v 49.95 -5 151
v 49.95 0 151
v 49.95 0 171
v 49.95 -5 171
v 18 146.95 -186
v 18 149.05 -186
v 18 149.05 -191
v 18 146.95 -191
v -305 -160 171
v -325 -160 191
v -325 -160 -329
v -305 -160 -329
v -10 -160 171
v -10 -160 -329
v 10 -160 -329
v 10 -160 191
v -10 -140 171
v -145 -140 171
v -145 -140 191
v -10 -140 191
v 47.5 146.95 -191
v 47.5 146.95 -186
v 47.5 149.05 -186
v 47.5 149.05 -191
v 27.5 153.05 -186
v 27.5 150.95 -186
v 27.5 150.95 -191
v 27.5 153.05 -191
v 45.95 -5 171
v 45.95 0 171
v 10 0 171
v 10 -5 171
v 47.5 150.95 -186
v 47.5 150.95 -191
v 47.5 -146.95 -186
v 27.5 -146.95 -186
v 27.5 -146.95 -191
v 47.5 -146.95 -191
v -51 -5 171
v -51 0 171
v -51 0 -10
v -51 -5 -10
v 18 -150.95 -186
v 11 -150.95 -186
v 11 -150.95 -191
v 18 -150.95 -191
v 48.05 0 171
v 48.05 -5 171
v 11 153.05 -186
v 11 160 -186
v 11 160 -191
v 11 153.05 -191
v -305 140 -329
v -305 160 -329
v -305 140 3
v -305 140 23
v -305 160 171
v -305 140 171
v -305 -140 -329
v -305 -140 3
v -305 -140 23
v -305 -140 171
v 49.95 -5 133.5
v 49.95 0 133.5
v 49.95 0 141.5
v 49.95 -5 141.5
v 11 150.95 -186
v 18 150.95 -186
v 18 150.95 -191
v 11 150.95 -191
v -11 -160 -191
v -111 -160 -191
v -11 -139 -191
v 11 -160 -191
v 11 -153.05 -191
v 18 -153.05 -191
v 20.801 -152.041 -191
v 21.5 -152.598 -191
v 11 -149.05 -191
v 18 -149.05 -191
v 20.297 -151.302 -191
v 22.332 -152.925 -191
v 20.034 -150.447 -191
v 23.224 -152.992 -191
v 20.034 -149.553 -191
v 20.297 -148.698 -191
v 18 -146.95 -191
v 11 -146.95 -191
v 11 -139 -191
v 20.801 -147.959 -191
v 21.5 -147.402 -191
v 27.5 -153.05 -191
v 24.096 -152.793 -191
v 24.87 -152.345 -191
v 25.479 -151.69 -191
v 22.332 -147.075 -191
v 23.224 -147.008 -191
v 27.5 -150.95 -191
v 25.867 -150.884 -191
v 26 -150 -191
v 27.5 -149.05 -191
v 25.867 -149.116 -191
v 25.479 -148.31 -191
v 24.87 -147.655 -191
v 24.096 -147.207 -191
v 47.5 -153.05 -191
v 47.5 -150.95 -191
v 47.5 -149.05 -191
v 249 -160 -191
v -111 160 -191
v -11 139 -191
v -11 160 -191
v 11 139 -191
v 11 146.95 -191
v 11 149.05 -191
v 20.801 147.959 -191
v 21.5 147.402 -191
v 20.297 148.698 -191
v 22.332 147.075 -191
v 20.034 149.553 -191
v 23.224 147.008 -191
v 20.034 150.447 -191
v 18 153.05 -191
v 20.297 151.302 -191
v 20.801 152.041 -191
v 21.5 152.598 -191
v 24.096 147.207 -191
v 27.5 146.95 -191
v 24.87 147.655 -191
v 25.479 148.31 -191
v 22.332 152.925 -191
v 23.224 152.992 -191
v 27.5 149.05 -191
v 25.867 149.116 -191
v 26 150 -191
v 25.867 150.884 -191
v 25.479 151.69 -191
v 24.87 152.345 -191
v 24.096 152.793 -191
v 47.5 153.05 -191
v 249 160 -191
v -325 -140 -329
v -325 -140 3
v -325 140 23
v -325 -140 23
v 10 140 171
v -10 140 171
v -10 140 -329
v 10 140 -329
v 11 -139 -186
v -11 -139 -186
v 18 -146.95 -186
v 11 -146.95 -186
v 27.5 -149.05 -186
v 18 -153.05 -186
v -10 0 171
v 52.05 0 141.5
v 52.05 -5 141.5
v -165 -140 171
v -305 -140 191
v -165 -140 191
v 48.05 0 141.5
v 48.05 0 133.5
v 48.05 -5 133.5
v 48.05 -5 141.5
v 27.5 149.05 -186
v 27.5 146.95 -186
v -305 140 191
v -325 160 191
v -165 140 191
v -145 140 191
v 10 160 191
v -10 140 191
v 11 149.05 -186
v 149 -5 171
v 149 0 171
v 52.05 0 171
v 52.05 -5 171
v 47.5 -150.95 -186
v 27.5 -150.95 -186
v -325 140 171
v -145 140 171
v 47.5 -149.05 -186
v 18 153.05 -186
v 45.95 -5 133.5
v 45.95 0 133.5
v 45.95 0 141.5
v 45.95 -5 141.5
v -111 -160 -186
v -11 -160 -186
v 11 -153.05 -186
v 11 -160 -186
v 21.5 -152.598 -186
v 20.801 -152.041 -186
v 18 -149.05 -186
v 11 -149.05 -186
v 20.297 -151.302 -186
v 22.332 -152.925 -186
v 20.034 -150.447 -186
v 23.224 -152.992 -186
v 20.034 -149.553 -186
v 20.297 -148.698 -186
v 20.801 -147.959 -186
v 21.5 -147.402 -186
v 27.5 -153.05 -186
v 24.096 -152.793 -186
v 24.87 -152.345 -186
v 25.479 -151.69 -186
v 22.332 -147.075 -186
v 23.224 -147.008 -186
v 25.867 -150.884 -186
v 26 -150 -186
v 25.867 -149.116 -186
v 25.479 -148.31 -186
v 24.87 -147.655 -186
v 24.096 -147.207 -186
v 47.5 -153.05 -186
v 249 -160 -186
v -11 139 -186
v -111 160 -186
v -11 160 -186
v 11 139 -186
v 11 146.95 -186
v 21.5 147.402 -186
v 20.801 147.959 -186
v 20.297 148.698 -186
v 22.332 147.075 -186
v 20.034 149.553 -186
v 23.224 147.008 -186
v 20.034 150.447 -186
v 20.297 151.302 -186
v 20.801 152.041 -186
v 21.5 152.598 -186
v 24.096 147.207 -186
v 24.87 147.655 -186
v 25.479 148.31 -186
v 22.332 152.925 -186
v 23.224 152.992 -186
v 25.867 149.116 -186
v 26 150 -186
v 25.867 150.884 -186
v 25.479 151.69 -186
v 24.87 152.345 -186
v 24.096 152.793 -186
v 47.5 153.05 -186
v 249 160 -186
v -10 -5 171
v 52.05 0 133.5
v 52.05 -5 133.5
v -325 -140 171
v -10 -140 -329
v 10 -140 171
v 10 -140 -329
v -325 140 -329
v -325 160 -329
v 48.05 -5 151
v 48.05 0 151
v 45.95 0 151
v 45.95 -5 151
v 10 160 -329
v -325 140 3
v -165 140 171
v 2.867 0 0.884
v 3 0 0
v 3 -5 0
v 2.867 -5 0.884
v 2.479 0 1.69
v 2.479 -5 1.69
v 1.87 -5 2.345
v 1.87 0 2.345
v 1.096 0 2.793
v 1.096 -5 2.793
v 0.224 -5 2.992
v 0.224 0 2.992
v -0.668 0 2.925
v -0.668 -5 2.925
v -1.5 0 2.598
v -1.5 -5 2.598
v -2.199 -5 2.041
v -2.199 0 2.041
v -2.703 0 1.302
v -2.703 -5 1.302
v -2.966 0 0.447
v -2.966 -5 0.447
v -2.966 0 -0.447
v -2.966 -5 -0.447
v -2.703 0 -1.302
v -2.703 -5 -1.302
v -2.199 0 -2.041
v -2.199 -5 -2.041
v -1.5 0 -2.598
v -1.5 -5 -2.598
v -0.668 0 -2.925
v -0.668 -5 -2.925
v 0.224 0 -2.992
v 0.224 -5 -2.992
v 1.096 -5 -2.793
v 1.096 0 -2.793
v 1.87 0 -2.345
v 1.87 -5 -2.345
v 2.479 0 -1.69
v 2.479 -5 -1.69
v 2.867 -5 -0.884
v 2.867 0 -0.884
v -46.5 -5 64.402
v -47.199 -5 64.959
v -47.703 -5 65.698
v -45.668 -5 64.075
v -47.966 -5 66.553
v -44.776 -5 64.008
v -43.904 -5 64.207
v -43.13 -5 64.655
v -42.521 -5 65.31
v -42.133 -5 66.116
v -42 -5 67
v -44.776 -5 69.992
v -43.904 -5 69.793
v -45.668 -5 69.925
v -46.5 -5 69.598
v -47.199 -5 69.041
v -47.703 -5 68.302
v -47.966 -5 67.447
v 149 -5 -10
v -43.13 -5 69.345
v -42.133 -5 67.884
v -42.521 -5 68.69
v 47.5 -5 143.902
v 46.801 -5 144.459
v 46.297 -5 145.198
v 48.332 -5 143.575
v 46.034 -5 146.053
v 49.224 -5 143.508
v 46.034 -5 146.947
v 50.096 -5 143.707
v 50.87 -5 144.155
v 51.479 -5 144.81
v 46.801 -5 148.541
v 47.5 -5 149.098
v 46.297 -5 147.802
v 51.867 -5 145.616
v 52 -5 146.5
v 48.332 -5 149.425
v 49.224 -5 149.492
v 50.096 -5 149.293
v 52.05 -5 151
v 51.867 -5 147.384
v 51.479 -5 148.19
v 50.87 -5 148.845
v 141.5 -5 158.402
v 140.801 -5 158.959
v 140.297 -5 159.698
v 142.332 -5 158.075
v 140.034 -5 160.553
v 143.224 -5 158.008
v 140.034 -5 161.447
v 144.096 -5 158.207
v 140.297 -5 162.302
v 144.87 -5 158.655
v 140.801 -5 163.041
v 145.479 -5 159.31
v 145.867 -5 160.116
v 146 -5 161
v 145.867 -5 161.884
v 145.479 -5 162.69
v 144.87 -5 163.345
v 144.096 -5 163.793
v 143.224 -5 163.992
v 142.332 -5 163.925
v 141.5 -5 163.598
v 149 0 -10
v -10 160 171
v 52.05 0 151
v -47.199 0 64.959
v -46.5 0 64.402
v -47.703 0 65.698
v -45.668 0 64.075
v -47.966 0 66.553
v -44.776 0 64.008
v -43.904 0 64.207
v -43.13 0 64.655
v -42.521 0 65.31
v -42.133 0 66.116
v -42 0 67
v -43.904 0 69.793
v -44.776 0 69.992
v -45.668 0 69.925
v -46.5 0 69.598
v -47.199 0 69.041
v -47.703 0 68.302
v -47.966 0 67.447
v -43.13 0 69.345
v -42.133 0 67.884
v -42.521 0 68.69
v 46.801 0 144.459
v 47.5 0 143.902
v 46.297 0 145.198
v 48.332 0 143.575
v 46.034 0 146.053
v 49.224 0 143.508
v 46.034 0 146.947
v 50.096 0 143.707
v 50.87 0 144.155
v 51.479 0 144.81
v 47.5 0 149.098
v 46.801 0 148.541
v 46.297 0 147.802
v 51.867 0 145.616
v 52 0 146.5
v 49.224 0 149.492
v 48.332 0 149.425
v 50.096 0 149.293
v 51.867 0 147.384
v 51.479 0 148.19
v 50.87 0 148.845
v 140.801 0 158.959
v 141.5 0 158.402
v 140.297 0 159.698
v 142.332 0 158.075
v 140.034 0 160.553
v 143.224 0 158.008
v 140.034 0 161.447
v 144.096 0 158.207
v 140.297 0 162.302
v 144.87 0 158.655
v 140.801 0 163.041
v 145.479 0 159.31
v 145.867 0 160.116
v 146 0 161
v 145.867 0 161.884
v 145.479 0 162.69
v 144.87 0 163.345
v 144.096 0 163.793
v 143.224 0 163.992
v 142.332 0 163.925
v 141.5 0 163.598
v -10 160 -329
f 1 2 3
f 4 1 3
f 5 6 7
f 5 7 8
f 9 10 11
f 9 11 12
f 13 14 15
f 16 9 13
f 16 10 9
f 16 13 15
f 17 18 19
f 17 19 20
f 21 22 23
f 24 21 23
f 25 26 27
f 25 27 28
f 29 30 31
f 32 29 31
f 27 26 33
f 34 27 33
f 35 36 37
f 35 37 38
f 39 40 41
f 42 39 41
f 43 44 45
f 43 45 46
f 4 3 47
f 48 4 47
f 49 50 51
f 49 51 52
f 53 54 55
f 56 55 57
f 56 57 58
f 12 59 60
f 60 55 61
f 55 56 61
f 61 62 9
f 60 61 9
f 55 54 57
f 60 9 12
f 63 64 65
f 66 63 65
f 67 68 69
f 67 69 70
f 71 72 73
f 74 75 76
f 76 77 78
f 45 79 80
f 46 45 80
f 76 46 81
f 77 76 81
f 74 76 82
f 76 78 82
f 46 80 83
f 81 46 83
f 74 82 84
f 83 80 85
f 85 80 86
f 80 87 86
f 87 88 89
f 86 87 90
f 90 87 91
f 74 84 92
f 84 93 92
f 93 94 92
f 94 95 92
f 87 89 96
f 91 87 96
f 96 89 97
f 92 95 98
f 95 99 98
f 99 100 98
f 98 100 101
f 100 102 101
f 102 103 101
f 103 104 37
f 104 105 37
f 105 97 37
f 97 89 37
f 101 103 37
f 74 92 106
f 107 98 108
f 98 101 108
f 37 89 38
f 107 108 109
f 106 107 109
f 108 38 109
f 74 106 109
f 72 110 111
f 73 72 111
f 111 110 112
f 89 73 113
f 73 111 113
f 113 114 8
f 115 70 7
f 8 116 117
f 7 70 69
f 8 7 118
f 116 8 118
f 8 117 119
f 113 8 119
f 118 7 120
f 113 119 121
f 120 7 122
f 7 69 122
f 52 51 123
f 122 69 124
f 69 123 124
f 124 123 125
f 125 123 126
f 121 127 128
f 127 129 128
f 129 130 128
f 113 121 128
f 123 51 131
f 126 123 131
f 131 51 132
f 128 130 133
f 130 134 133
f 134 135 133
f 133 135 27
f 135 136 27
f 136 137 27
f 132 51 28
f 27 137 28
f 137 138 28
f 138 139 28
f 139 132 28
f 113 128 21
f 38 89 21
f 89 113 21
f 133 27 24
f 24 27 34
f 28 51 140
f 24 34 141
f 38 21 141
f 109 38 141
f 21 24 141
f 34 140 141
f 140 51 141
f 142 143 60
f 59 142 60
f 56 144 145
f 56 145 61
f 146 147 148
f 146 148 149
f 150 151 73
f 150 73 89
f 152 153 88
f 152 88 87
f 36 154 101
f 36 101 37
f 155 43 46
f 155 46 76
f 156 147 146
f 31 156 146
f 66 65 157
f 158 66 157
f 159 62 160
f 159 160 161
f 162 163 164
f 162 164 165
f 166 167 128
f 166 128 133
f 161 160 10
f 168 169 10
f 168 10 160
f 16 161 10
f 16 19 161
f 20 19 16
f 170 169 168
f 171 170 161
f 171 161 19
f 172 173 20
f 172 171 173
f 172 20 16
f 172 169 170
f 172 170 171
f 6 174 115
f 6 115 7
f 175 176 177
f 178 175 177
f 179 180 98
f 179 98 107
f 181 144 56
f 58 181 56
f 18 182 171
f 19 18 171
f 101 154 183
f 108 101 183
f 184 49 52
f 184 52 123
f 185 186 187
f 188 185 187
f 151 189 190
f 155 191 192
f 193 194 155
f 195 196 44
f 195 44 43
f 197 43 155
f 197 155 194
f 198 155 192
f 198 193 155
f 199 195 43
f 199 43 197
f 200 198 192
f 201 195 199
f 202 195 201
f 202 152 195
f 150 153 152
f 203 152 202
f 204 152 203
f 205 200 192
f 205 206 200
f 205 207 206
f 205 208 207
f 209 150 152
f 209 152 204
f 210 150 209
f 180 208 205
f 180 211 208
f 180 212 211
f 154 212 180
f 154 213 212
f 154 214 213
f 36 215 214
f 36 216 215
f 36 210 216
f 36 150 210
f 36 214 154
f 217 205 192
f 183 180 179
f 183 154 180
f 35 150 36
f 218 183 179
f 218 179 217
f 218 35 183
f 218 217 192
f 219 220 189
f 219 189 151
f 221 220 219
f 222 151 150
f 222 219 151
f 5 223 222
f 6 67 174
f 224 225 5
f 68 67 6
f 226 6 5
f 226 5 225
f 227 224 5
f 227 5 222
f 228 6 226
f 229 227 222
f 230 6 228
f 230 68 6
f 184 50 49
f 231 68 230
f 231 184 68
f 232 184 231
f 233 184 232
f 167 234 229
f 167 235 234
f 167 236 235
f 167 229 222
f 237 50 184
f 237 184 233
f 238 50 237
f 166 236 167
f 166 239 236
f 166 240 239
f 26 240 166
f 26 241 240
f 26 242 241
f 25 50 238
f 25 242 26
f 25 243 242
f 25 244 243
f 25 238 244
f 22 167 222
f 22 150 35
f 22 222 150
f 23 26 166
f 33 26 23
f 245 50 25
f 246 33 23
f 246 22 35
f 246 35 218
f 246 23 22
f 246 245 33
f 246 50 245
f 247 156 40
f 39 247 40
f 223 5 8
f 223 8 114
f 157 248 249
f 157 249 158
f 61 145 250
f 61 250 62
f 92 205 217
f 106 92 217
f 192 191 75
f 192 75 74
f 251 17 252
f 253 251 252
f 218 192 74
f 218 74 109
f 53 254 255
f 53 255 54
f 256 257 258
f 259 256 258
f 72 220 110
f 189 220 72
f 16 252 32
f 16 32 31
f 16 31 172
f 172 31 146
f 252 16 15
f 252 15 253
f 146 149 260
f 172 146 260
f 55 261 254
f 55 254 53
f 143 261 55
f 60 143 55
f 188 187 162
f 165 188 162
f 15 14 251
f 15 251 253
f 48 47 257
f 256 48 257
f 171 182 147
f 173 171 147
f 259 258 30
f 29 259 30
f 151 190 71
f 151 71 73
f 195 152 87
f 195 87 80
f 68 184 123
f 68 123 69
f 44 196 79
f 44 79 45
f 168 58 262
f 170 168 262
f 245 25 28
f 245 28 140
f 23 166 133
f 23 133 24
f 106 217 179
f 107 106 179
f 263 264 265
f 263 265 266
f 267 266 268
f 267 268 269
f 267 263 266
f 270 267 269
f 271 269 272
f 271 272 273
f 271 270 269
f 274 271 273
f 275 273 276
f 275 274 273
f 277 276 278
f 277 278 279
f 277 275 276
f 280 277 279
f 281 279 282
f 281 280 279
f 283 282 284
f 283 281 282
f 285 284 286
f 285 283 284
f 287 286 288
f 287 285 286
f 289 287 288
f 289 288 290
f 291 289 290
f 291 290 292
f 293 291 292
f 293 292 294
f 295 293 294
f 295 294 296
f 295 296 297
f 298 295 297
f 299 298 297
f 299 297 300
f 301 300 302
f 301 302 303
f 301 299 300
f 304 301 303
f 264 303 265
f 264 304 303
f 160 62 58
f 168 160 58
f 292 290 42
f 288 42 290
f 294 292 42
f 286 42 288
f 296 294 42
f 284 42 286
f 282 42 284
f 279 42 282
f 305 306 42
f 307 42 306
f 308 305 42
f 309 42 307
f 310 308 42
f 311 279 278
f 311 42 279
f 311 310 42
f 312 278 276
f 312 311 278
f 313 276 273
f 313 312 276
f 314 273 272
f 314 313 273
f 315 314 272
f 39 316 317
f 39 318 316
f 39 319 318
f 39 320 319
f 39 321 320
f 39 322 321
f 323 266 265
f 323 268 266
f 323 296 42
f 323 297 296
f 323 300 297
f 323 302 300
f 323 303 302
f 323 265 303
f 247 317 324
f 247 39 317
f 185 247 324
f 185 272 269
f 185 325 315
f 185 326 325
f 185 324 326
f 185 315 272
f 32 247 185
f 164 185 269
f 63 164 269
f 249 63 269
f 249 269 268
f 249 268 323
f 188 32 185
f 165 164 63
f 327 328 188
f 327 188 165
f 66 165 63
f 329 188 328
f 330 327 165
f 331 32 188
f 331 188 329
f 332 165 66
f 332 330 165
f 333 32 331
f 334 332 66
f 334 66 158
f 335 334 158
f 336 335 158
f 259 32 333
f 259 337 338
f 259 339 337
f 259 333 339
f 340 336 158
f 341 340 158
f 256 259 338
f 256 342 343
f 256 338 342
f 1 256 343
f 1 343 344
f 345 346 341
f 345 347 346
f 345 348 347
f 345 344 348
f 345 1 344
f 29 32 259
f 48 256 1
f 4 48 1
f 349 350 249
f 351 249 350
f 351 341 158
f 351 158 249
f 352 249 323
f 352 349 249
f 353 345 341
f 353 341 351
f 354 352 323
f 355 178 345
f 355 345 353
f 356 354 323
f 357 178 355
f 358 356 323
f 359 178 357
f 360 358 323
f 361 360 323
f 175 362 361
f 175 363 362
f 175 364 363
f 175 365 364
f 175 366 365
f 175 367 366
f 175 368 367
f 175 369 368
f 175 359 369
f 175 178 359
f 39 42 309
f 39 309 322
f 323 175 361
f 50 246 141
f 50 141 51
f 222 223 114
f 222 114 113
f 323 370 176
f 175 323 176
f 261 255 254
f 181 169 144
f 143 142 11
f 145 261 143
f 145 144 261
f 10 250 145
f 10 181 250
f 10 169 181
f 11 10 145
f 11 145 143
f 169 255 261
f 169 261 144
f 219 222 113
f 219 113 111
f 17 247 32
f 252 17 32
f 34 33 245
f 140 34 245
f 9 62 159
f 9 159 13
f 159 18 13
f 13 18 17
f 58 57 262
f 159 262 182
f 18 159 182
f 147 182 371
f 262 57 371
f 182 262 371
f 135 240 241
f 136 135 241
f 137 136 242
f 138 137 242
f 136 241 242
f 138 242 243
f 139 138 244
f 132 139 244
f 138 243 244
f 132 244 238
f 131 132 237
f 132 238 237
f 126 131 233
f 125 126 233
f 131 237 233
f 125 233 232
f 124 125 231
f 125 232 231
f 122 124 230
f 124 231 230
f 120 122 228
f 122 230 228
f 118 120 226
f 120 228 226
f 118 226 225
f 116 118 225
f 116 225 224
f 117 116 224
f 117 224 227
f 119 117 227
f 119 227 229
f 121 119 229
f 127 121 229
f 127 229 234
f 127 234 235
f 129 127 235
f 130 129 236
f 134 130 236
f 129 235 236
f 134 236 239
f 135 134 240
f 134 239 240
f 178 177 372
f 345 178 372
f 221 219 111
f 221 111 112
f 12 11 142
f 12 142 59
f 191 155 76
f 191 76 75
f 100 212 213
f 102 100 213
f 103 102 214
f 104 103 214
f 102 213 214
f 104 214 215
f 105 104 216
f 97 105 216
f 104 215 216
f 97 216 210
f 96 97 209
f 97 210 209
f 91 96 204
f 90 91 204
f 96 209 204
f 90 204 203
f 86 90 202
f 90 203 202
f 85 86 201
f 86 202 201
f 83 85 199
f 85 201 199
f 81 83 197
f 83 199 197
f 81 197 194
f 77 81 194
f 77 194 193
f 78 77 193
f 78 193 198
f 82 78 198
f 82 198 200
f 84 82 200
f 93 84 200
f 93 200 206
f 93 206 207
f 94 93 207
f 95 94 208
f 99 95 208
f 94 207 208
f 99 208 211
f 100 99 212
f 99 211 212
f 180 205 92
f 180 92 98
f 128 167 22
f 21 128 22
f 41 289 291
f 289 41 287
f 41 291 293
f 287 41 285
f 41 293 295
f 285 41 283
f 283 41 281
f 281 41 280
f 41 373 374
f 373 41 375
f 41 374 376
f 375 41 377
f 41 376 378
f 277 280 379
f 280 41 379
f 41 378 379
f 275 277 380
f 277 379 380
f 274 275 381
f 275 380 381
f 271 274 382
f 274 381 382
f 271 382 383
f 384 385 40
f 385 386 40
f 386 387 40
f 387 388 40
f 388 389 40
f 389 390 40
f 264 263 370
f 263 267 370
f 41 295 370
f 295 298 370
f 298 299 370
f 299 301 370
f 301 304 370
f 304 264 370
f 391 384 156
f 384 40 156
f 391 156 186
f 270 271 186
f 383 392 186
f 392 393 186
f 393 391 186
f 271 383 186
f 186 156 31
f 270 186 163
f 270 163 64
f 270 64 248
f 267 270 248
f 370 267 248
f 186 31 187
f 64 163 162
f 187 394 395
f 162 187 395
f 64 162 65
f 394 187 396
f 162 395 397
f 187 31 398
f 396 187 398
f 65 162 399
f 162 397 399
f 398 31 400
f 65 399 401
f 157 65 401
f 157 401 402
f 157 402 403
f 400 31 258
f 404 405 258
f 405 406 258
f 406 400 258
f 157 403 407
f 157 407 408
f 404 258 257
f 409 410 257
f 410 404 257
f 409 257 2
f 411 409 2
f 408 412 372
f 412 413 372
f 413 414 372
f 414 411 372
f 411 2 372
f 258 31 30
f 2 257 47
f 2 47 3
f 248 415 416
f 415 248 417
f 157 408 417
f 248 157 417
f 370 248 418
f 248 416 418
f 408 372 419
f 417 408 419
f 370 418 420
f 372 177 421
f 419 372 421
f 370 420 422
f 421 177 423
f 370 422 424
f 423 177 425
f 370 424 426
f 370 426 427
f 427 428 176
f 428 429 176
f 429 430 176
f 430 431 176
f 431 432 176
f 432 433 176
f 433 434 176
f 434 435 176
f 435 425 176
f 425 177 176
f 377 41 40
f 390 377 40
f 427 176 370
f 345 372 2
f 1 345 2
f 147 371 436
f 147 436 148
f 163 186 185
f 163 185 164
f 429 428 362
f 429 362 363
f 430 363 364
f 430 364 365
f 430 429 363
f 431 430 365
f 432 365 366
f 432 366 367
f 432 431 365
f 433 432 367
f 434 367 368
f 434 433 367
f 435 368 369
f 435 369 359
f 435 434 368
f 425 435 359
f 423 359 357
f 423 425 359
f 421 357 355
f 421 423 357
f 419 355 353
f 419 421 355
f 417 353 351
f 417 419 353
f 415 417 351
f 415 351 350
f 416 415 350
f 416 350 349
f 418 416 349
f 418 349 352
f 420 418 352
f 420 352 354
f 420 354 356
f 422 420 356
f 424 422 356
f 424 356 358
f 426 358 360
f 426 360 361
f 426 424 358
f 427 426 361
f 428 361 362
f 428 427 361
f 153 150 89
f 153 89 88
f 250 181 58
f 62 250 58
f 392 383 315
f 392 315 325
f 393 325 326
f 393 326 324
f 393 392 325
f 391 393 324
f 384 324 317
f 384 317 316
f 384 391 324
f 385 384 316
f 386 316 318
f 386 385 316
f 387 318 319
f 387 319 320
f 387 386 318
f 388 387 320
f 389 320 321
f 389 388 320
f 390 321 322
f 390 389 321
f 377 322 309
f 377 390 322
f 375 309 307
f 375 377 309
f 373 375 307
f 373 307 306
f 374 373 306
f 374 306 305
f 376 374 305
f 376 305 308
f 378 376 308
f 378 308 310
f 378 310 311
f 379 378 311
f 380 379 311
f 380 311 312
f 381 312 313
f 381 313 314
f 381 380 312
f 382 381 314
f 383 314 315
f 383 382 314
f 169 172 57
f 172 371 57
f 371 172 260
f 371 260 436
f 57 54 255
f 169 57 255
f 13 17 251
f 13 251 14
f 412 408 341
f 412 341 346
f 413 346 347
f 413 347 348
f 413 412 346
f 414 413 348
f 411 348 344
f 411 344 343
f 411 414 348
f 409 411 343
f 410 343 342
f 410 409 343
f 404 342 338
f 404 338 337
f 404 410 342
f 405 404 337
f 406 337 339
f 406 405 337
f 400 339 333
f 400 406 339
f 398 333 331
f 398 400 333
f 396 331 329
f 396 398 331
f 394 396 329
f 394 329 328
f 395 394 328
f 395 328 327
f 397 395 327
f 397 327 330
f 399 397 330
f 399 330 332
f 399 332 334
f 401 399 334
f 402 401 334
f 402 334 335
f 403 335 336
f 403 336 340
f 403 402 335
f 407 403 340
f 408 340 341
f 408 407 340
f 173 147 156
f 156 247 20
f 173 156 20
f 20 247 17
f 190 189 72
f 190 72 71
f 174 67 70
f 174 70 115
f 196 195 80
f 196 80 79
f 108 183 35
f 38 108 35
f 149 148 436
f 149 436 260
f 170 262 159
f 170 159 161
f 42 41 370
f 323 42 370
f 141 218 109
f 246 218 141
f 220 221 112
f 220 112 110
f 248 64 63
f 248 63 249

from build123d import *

# Parameters (mm, degrees)
F0_R      = 3
F0_W      = 2.1
F0_H      = 8
F1_DEPTH  = 5
F3_W      = 295
F3_H      = 20
F4_DEPTH  = 20
F5_W      = 20
F5_H      = 20
F6_DEPTH  = 500
F8_R      = 3
F8_W      = 20
F8_H      = 2.1
F9_DEPTH  = 5
F10_W     = 20
F10_H     = 20
F11_DEPTH = 280
F12_W     = 20
F12_H     = 20
F13_DEPTH = 280


with BuildPart() as f1:
    # F0 (on Front) → F1 (new body)
    with BuildSketch(Plane.XZ):
        Polygon((-51, 171), (-51, -10), (149, -10), (149, 171), (52.05, 171), (52.05, 151), (49.95, 151), (49.95, 171), (48.05, 171), (48.05, 151), (45.95, 151), (45.95, 171), align=None)
        Circle(F0_R, mode=Mode.SUBTRACT)
        with Locations((-45, 67)):
            Circle(F0_R, mode=Mode.SUBTRACT)
        with Locations((47, 137.5)):
            Rectangle(F0_W, F0_H, mode=Mode.SUBTRACT)
        with Locations((51, 137.5)):
            Rectangle(F0_W, F0_H, mode=Mode.SUBTRACT)
        with Locations((49, 146.5)):
            Circle(F0_R, mode=Mode.SUBTRACT)
        with Locations((143, 161)):
            Circle(F0_R, mode=Mode.SUBTRACT)
    extrude(amount=F1_DEPTH)

    # F3 (on offset) → F4 (join)
    with BuildSketch(Plane.XY.offset(171)):
        Polygon((-10, -160), (10, -160), (10, 160), (-10, 160), (-10, 140), (-10, -140), align=None)
        with Locations((-157.5, -150)):
            Rectangle(F3_W, F3_H)
        Polygon((-325, -160), (-305, -160), (-305, -140), (-305, 140), (-305, 160), (-325, 160), align=None)
        with Locations((-157.5, 150)):
            Rectangle(F3_W, F3_H)
    extrude(amount=F4_DEPTH)

    # F5 (on face) → F6 (join)
    with BuildSketch(Plane(origin=(0, 0, 171), x_dir=(1, 0, 0), z_dir=(0, 0, -1))):
        with Locations((-315, 150)):
            Rectangle(F5_W, F5_H)
        with Locations((-315, -150)):
            Rectangle(F5_W, F5_H)
        with Locations((0, -150)):
            Rectangle(F5_W, F5_H)
        with Locations((0, 150)):
            Rectangle(F5_W, F5_H)
    extrude(amount=F6_DEPTH)

    # F10 (on face) → F11 (join)
    with BuildSketch(Plane.XZ.offset(-140)):
        with Locations((-315, 13)):
            Rectangle(F10_W, F10_H)
    extrude(amount=F11_DEPTH)

    # F12 (on face) → F13 (join)
    with BuildSketch(Plane.XZ.offset(-140)):
        with Locations((-155, 181)):
            Rectangle(F12_W, F12_H)
    extrude(amount=F13_DEPTH)


with BuildPart() as f9:
    # F8 (on offset) → F9 (new body)
    with BuildSketch(Plane.XY.offset(-186)):
        Polygon((-11, -139), (11, -139), (11, -146.95), (18, -146.95), (18, -149.05), (11, -149.05), (11, -150.95), (18, -150.95), (18, -153.05), (11, -153.05), (11, -160), (249, -160), (249, 160), (11, 160), (11, 153.05), (18, 153.05), (18, 150.95), (11, 150.95), (11, 149.05), (18, 149.05), (18, 146.95), (11, 146.95), (11, 139), (0, 139), (-11, 139), (-11, 160), (-111, 160), (-111, -160), (-11, -160), align=None)
        with Locations((23, -150)):
            Circle(F8_R, mode=Mode.SUBTRACT)
        with Locations((37.5, -152)):
            Rectangle(F8_W, F8_H, mode=Mode.SUBTRACT)
        with Locations((37.5, -148)):
            Rectangle(F8_W, F8_H, mode=Mode.SUBTRACT)
        with Locations((23, 150)):
            Circle(F8_R, mode=Mode.SUBTRACT)
        with Locations((37.5, 148)):
            Rectangle(F8_W, F8_H, mode=Mode.SUBTRACT)
        with Locations((37.5, 152)):
            Rectangle(F8_W, F8_H, mode=Mode.SUBTRACT)
    extrude(amount=-F9_DEPTH)


solid = Compound([f1.part, f9.part])
